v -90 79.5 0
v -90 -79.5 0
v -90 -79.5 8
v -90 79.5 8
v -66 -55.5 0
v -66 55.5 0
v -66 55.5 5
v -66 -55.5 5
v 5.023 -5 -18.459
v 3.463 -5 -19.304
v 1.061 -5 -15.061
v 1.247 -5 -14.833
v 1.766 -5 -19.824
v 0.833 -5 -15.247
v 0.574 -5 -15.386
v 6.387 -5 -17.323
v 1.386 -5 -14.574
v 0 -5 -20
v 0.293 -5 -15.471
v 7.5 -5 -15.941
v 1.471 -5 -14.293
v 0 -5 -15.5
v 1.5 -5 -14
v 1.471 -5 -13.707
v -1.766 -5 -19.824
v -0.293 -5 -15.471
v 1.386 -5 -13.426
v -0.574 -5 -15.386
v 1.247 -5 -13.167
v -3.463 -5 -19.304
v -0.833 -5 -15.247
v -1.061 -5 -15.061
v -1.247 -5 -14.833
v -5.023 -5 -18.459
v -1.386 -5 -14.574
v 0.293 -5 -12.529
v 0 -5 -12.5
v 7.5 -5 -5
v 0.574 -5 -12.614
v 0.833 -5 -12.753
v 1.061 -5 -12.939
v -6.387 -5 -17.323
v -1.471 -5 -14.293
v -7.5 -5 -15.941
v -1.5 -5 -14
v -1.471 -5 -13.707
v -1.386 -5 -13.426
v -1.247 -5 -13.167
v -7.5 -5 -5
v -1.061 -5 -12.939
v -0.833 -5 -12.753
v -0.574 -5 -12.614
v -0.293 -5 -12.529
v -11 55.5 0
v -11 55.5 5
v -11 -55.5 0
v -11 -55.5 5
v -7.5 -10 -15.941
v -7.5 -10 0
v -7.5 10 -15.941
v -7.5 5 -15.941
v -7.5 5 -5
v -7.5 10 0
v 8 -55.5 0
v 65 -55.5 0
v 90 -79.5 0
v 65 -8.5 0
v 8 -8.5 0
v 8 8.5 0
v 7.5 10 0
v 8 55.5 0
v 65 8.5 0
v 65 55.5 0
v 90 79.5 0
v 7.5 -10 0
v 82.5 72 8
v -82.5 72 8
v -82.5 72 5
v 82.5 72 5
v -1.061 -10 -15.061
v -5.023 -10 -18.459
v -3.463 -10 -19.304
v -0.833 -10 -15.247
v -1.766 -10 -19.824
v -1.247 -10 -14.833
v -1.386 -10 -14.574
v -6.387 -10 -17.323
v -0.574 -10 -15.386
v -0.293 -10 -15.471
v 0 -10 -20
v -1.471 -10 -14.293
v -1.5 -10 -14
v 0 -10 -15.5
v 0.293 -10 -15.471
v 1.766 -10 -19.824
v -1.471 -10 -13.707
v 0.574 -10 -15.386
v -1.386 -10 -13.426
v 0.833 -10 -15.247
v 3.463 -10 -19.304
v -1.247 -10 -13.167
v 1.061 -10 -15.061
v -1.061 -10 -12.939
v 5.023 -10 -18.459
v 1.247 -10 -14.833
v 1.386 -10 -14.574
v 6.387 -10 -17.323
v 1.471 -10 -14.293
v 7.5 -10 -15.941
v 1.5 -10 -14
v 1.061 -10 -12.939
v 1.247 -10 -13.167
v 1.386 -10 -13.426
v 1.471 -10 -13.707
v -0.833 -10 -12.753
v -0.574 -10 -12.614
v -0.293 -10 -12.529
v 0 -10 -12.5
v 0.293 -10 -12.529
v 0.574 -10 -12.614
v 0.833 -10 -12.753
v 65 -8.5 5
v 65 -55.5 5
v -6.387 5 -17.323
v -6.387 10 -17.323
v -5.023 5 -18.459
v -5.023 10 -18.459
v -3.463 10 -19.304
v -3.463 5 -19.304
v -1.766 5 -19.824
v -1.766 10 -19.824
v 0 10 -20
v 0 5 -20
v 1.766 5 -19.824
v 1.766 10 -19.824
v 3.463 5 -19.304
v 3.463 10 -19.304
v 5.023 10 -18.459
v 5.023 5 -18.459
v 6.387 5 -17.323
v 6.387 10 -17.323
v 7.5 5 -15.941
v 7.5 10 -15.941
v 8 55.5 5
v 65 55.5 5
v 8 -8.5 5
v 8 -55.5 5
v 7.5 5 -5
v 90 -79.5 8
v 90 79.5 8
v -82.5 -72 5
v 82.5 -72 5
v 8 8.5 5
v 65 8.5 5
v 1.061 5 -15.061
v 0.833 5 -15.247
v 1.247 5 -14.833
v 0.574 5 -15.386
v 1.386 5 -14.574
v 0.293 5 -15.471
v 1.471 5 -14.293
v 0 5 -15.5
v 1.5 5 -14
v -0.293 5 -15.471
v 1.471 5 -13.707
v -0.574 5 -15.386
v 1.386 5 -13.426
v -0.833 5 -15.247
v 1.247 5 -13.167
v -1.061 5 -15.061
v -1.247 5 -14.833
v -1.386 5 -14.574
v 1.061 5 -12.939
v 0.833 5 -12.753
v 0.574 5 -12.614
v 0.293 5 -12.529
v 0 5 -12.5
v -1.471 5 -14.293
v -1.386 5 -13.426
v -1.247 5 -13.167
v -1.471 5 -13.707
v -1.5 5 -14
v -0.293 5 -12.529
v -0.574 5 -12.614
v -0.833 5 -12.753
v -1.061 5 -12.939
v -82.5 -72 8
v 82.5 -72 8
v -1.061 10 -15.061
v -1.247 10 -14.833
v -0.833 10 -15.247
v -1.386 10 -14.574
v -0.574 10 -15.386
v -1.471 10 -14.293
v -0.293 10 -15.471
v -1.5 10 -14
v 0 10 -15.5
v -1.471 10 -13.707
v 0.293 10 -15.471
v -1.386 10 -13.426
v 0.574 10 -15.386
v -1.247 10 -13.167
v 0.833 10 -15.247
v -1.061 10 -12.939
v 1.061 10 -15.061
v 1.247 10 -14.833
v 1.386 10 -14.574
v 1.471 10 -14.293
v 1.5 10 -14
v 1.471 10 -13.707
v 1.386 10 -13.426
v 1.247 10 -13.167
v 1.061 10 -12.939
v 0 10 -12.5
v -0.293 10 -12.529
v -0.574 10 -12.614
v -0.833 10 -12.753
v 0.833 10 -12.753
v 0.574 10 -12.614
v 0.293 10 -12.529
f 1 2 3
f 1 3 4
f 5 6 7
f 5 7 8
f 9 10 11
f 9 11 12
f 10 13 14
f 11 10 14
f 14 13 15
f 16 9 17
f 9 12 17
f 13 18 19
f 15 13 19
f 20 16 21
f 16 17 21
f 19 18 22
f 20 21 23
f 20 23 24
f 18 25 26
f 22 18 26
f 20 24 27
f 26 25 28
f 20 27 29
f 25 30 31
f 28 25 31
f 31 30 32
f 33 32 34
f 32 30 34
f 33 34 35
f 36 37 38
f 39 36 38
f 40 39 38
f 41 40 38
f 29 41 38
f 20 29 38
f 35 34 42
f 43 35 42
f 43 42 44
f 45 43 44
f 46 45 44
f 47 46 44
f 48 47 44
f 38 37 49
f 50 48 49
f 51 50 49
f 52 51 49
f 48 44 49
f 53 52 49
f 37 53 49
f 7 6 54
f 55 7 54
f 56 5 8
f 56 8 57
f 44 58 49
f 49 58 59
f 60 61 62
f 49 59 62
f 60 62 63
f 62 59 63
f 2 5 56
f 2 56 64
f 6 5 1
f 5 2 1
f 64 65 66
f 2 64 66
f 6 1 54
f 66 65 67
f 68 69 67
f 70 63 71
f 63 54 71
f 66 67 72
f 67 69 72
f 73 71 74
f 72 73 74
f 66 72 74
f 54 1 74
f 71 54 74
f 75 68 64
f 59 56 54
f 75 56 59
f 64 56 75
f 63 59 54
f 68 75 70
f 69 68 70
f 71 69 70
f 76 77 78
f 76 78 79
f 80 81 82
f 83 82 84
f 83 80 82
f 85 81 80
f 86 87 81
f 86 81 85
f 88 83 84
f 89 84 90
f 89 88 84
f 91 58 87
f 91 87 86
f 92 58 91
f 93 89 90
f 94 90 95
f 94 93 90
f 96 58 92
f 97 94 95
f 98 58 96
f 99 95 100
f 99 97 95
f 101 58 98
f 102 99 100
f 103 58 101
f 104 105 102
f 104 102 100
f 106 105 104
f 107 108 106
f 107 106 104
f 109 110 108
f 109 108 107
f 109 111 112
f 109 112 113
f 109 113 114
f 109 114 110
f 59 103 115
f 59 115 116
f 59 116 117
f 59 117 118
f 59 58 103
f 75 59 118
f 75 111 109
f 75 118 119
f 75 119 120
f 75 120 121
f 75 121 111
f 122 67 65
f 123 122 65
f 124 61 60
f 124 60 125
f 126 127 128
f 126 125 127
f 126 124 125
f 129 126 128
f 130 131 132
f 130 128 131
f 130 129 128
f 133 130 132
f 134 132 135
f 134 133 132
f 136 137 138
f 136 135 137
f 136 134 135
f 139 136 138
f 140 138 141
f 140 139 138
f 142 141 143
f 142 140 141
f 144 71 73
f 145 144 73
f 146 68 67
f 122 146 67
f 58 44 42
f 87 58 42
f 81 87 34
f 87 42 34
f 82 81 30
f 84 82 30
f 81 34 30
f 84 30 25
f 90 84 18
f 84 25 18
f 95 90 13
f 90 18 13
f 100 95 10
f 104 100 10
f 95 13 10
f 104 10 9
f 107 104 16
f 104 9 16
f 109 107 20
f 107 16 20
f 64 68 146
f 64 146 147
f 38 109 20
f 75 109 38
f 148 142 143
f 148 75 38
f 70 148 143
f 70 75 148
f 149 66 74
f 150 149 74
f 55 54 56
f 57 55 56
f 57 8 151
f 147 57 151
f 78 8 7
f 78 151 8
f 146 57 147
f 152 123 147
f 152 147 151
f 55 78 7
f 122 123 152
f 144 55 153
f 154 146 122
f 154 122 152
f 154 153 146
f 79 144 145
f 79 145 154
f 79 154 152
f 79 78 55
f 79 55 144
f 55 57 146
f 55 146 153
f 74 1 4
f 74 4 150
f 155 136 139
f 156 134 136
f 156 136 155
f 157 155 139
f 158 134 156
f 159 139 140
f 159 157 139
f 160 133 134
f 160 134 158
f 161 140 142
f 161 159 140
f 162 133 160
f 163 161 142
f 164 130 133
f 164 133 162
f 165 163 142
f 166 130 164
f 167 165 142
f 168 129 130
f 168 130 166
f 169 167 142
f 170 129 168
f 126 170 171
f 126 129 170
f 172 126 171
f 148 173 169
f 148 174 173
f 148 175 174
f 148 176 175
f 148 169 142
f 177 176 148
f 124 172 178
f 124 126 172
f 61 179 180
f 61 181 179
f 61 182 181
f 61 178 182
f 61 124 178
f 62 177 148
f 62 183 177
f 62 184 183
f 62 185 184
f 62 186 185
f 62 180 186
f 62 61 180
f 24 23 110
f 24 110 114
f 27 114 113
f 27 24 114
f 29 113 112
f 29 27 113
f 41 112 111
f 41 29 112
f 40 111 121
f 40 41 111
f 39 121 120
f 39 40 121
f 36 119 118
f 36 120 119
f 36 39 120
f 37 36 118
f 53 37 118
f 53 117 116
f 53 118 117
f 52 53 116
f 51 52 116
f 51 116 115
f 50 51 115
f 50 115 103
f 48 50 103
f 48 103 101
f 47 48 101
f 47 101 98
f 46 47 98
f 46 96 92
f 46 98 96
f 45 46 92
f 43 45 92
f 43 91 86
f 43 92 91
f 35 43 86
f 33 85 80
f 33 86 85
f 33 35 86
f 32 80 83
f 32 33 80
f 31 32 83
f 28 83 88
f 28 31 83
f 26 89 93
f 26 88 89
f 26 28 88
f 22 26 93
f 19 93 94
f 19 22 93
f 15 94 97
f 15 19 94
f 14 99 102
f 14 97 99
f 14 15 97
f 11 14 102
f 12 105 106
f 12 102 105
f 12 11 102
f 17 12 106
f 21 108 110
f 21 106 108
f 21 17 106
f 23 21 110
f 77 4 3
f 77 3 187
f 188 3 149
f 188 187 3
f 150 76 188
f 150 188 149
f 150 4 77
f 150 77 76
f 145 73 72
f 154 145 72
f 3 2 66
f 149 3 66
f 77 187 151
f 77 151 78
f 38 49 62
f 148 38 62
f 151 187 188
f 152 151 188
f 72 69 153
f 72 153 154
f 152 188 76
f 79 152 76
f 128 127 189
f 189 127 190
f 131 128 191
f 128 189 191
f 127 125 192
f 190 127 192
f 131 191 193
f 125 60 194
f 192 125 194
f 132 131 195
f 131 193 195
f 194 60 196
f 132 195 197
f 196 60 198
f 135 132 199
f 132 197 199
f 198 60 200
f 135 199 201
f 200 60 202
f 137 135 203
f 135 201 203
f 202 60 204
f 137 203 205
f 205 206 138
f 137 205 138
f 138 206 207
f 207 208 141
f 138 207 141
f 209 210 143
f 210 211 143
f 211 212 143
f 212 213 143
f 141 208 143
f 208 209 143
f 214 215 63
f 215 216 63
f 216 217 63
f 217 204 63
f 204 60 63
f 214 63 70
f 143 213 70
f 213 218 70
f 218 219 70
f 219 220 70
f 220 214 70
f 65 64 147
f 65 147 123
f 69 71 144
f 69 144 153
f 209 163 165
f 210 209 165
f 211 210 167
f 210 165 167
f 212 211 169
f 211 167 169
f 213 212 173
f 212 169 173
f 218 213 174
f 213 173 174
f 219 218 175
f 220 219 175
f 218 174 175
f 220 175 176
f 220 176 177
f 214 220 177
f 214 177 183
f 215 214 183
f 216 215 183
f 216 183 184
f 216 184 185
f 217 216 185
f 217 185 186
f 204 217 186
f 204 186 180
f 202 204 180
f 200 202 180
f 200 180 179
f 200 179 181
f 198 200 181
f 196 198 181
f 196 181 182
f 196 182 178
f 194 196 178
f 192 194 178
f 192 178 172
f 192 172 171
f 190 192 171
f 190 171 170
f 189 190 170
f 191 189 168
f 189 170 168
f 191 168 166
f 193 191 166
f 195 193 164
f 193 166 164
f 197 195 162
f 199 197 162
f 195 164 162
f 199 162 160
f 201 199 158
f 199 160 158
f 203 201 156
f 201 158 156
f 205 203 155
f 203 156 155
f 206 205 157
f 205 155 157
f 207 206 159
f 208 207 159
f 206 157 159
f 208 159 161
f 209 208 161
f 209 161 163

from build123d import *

# Parameters (mm, degrees)
SKETCH001_W          = 180
SKETCH001_H          = 159
PAD001_DEPTH         = 8
SKETCH002_W          = 55
SKETCH002_H          = 111
SKETCH002_W_2        = 57
SKETCH002_H_2        = 47
POCKET_DEPTH         = 8.001
SKETCH013_W          = 15
SKETCH013_H          = 20
PAD006_DEPTH         = 20
SKETCH014_W          = 10
SKETCH014_H          = 15
POCKET001_DEPTH      = 90.001
POCKET001_DEPTH_BACK = 90.001
SKETCH015_R          = 1.5
POCKET002_DEPTH      = 79.501
POCKET002_DEPTH_BACK = 79.501
SKETCH016_W          = 165
SKETCH016_H          = 144
POCKET003_DEPTH      = 3


with BuildPart() as part:
    # Sketch001 → Pad001 (new body)
    with BuildSketch(Plane.XY):
        Rectangle(SKETCH001_W, SKETCH001_H)
    extrude(amount=PAD001_DEPTH)

    # Sketch002 → Pocket (cut, through all)
    with BuildSketch(Plane(origin=(0, 0, 0), x_dir=(1, 0, 0), z_dir=(0, 0, -1))):
        with Locations((-38.5, 0)):
            Rectangle(SKETCH002_W, SKETCH002_H)
        with Locations((36.5, 32)):
            Rectangle(SKETCH002_W_2, SKETCH002_H_2)
        with Locations((36.5, -32)):
            Rectangle(SKETCH002_W_2, SKETCH002_H_2)
    extrude(amount=-POCKET_DEPTH, mode=Mode.SUBTRACT)

    # Sketch013 (on DatumPlane) → Pad006 (join)
    with BuildSketch(Plane.XY):
        Rectangle(SKETCH013_W, SKETCH013_H)
    extrude(amount=-PAD006_DEPTH)

    # Sketch014 (on Plane of DatumPlane002) → Pocket001 (cut, two sides)
    with BuildSketch(Plane.YZ) as pocket001_sk:
        with Locations((0, -12.5)):
            Rectangle(SKETCH014_W, SKETCH014_H)
    extrude(amount=-POCKET001_DEPTH, mode=Mode.SUBTRACT)
    extrude(pocket001_sk.sketch, amount=POCKET001_DEPTH_BACK, mode=Mode.SUBTRACT)

    # Sketch015 (on DatumPlane) → Pocket002 (cut, two sides)
    with BuildSketch(Plane.XZ) as pocket002_sk:
        with Locations((0, -14)):
            Circle(SKETCH015_R)
        with BuildLine():
            ThreePointArc((-7.5, -15.941091), (0, -20), (7.5, -15.941091))
            Line((7.5, -15.941091), (9.5, -15.941091))
            Line((9.5, -15.941091), (9.5, -32.907985))
            Line((9.5, -32.907985), (-9.5, -32.907985))
            Line((-9.5, -32.907985), (-9.5, -15.941091))
            Line((-9.5, -15.941091), (-7.5, -15.941091))
        make_face()
    extrude(amount=-POCKET002_DEPTH, mode=Mode.SUBTRACT)
    extrude(pocket002_sk.sketch, amount=POCKET002_DEPTH_BACK, mode=Mode.SUBTRACT)

    # Sketch016 (on DatumPlane) → Pocket003 (cut)
    with BuildSketch(Plane.XY.offset(8)):
        Rectangle(SKETCH016_W, SKETCH016_H)
    extrude(amount=-POCKET003_DEPTH, mode=Mode.SUBTRACT)


solid = part.part
